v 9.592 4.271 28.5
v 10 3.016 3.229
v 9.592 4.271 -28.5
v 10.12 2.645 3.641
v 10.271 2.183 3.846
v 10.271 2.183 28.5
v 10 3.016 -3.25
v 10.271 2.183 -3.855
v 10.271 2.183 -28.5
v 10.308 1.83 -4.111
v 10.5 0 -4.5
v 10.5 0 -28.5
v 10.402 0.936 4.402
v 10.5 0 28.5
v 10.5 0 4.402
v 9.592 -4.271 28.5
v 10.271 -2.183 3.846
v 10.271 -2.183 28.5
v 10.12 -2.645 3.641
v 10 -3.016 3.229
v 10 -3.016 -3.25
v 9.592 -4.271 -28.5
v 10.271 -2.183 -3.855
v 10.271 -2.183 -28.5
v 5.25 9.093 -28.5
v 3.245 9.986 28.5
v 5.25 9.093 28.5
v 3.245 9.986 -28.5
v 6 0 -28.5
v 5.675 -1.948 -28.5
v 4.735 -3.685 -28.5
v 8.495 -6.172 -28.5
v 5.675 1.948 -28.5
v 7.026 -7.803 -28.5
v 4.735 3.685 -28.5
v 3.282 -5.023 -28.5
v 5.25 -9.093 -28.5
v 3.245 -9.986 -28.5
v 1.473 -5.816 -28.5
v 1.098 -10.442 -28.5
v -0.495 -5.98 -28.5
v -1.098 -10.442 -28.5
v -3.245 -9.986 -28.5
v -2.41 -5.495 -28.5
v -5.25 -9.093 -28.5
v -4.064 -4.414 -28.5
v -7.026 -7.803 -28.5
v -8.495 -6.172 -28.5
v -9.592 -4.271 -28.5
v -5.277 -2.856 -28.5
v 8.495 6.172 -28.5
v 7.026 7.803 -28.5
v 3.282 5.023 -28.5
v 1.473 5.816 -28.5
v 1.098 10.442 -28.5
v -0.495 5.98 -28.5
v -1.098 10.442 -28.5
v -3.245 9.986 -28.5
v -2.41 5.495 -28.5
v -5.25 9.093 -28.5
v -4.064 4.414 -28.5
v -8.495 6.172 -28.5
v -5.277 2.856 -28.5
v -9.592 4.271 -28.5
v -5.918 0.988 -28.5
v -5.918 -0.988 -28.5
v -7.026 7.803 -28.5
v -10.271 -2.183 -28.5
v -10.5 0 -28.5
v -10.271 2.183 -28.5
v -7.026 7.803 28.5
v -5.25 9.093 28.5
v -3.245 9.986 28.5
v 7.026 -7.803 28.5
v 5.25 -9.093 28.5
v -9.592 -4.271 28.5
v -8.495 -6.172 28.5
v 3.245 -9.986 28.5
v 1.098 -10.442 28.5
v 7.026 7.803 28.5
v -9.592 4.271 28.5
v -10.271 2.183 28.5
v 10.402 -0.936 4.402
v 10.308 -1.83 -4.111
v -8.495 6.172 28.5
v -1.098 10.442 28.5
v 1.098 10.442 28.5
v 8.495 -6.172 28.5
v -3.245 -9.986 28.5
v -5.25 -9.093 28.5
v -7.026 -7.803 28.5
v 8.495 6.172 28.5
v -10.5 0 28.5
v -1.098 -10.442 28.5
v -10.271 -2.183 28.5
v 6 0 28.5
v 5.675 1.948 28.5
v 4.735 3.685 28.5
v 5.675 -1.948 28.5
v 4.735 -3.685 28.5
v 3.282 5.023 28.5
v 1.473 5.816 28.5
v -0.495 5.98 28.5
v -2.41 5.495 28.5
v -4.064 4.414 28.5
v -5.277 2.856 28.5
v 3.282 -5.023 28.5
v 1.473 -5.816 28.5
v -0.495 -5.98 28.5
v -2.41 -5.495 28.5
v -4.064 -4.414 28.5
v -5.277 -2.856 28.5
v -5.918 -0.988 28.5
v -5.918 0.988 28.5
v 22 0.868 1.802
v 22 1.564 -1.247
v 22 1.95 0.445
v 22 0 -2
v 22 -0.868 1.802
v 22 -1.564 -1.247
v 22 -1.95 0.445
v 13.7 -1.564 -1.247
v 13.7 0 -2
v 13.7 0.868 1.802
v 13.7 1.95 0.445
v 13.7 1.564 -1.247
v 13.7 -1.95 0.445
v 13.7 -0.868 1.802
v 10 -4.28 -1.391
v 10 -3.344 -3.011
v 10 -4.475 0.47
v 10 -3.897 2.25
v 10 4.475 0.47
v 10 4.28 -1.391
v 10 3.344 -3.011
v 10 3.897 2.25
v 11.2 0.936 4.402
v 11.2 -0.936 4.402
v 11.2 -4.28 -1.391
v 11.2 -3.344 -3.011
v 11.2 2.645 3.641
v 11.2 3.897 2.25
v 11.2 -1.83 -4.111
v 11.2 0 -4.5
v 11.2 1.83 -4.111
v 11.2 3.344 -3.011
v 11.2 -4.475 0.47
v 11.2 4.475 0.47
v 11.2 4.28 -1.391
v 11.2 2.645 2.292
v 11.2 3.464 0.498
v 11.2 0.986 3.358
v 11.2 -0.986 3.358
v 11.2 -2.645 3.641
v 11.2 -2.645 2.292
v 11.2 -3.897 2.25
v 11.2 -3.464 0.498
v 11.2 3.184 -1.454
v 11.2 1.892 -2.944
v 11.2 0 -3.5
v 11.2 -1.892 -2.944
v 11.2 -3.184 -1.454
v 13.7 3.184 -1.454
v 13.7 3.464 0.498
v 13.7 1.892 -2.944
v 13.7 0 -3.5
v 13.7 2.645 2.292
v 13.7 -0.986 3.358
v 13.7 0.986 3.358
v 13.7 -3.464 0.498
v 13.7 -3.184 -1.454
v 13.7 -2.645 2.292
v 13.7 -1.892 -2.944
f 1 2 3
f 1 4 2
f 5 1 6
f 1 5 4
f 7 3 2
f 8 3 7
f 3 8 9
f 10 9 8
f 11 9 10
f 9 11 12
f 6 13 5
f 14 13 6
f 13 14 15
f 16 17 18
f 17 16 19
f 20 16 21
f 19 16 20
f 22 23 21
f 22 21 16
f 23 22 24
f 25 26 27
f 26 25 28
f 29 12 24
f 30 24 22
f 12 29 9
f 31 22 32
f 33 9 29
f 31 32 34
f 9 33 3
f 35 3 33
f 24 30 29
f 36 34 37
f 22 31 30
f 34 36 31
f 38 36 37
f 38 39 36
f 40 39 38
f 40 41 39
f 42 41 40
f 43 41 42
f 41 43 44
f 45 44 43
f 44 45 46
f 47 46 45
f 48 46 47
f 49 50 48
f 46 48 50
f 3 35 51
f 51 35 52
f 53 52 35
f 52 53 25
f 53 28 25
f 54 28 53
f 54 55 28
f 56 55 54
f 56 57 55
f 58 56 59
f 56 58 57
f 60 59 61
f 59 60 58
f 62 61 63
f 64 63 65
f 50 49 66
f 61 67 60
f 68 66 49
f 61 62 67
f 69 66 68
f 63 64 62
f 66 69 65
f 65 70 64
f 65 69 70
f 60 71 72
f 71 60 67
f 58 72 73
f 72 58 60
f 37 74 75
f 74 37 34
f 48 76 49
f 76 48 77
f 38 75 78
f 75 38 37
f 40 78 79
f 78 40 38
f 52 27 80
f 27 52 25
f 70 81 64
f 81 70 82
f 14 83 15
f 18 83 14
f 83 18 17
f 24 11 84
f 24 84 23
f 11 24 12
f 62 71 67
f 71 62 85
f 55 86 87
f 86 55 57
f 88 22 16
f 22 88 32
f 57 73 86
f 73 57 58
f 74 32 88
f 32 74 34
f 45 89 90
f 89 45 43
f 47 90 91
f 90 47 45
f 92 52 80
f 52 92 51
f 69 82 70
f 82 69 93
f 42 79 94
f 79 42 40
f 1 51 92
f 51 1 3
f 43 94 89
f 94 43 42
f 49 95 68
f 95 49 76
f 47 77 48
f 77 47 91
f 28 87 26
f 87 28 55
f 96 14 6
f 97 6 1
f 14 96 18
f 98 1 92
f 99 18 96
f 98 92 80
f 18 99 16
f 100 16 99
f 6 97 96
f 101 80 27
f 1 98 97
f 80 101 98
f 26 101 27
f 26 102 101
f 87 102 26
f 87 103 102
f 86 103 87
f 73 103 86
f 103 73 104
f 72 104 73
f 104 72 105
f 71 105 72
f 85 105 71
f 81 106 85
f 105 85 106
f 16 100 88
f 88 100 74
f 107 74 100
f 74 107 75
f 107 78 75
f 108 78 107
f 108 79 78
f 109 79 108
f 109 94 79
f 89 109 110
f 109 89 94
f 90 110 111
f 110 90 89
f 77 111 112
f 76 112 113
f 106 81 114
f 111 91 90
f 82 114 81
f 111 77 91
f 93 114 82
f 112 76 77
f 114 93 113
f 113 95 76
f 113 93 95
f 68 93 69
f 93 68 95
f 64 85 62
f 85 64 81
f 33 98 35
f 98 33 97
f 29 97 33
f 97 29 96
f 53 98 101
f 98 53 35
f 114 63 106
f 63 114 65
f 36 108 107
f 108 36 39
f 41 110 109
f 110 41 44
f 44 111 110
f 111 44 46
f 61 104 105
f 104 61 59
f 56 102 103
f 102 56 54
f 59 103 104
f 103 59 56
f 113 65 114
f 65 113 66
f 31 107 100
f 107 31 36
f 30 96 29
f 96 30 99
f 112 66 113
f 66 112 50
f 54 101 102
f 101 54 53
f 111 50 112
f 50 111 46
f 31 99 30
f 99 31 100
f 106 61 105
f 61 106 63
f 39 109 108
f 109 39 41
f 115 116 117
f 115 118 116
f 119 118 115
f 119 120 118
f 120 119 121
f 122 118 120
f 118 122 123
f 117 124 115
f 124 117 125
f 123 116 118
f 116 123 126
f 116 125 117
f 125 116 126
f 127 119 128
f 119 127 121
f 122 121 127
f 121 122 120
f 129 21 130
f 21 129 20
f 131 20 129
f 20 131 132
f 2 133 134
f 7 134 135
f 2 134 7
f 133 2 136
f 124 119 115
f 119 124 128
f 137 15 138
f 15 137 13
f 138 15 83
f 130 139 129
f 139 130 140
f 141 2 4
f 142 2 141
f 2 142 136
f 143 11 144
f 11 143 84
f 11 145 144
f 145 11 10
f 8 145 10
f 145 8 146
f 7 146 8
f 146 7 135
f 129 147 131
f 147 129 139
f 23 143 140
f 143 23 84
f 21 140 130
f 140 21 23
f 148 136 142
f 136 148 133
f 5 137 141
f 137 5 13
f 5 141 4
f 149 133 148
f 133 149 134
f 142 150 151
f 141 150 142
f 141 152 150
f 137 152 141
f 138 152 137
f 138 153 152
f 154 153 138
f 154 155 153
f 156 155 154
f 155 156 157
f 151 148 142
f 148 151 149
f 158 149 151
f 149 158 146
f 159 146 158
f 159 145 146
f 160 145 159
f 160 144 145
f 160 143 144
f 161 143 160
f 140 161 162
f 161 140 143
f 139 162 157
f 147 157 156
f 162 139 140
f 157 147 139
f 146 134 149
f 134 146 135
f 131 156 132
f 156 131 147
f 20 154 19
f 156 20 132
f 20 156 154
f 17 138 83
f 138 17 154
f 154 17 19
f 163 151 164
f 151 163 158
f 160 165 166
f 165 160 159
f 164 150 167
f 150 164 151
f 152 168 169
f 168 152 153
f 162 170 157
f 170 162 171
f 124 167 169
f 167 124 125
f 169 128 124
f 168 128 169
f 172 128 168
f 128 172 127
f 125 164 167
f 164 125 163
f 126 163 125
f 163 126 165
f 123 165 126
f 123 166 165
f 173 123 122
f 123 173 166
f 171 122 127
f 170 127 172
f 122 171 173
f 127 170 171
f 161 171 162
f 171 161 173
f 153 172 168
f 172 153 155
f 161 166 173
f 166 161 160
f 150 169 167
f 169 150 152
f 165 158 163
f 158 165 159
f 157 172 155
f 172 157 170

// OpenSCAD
// Parameters
bore_diameter_mm = 12.0; //[6.0:24.0:0.1]
outer_diameter_mm = 21.0; //[10.5:42.0:0.1]
length_mm = 57.0; //[28.5:114.0:0.1]
outer_radius_mm = 10.5; //[5.25:21.0:0.1]
bore_radius_mm = 6.0; //[3.0:12.0:0.1]
eps_mm = 0.5; //[0.2:2.0:0.1]
screw_shank_radius_mm = 2.0; //[1.0:4.0:0.1]
screw_length_mm = 12.0; //[6.0:24.0:0.5]
washer_outer_radius_mm = 4.5; //[2.5:9.0:0.1]
washer_thickness_mm = 1.2; //[0.6:2.4:0.1]
screw_head_radius_mm = 3.5; //[2.0:7.0:0.1]
screw_head_height_mm = 2.5; //[1.2:5.0:0.1]

// Linear Bearing - complete geometry
module linear_bearing() {
  color("DimGray") {
    difference() {
      // Outer cylinder
      cylinder(r=outer_radius_mm, h=length_mm, center=true);
      // Inner bore
      cylinder(r=bore_radius_mm, h=length_mm + 2*eps_mm, center=true);
    }
  }
}

// Screw and Washer - complete geometry
module screw_and_washer() {
  color("Silver") {
    union() {
      // Screw shank
      translate([outer_radius_mm + screw_length_mm/2 - eps_mm, 0, 0])
        rotate([0, 90, 0])
        cylinder(r=screw_shank_radius_mm, h=screw_length_mm, center=true);
      // Washer
      translate([outer_radius_mm + washer_thickness_mm/2 - eps_mm, 0, 0])
        rotate([0, 90, 0])
        cylinder(r=washer_outer_radius_mm, h=washer_thickness_mm, center=true);
      // Screw head
      translate([outer_radius_mm + washer_thickness_mm + screw_head_height_mm/2 - eps_mm, 0, 0])
        rotate([0, 90, 0])
        cylinder(r=screw_head_radius_mm, h=screw_head_height_mm, center=true);
    }
  }
}

// Assembly
module assembly() {
  linear_bearing();
  screw_and_washer();
}

assembly();
